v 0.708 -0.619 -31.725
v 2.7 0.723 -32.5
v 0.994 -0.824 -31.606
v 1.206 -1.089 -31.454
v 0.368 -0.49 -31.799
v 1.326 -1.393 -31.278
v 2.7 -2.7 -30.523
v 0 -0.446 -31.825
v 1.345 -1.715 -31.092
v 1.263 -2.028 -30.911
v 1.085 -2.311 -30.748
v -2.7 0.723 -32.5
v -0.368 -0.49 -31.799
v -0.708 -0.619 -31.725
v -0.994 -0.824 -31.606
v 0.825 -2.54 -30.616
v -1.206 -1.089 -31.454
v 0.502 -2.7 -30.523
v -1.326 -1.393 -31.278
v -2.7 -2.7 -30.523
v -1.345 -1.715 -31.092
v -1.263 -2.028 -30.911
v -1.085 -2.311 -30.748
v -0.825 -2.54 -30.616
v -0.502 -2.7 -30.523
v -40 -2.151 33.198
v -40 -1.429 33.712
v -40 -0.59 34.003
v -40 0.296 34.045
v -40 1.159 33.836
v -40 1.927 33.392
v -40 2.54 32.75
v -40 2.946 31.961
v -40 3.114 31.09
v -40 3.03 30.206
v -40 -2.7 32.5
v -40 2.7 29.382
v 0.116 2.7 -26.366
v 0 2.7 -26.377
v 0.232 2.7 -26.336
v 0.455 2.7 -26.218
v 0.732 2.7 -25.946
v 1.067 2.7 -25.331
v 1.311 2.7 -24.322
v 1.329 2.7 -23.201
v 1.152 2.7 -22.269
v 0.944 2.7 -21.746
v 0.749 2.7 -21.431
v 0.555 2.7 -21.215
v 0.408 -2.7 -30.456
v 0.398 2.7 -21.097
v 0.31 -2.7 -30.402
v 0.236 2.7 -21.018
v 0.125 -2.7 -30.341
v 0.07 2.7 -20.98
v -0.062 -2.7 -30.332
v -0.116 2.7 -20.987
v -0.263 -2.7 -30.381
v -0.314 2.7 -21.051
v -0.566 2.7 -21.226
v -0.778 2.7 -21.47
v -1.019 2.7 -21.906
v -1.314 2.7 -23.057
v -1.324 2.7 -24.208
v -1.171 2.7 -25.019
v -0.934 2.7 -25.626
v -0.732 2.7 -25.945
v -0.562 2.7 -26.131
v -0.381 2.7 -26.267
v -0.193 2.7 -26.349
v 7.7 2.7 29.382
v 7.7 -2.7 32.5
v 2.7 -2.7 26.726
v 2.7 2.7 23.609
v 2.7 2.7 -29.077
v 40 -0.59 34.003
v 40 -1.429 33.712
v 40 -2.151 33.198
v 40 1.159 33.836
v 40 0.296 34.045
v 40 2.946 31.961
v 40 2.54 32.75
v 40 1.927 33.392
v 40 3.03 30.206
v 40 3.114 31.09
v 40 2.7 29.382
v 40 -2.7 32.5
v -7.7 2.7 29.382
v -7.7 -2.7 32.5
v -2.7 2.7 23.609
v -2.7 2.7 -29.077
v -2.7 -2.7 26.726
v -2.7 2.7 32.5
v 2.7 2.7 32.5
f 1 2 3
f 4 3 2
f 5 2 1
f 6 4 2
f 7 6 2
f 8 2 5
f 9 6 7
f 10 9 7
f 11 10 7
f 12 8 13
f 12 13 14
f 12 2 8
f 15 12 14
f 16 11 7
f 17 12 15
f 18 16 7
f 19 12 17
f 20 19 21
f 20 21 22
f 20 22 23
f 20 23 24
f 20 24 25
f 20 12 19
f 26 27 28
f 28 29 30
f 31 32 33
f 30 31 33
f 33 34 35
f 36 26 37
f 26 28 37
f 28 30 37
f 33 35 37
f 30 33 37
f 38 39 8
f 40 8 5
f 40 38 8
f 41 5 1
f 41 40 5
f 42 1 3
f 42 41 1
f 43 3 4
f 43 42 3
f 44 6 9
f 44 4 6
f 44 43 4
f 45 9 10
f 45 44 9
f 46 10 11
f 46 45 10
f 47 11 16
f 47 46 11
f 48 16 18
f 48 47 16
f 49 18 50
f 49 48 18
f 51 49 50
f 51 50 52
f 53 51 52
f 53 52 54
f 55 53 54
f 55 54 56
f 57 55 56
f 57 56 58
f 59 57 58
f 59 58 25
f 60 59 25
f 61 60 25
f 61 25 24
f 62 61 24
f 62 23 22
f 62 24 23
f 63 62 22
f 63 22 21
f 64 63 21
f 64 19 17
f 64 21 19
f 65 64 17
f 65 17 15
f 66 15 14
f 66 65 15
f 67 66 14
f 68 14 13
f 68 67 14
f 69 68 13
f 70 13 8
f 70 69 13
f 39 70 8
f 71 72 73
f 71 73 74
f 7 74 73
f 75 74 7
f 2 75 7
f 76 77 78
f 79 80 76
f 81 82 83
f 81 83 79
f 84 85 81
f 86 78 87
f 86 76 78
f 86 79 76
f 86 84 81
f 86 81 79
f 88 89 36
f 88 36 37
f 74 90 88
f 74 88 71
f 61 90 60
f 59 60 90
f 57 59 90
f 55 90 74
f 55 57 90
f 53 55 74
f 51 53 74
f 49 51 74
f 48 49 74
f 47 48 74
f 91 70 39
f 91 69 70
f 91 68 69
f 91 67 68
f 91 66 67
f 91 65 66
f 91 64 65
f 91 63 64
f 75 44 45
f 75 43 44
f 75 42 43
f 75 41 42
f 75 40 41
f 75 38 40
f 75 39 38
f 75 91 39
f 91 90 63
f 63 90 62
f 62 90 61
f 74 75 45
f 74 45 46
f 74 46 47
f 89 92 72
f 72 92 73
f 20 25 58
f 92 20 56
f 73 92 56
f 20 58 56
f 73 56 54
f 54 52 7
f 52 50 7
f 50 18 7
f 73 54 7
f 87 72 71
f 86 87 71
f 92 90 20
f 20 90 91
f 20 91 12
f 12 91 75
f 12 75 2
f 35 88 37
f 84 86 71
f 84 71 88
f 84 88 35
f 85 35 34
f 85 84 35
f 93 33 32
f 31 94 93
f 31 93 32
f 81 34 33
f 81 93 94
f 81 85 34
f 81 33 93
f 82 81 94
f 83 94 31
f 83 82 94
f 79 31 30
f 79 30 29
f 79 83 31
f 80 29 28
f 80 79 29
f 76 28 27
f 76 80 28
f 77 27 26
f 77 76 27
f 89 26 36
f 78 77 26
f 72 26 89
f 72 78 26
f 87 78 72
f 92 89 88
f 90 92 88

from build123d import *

# Parameters (mm, degrees)
SKETCH_1_W               = 5.4
SKETCH_1_H               = 65
EXTRUDE_1_DEPTH          = 2.7
CUT_EXTRUDE_1_DEPTH      = 33.723538928
CUT_EXTRUDE_1_DEPTH_BACK = 33.723538928
EXTRUDE_2_DEPTH          = 40
CHAMFER_1_SIZE           = 5
CUT_EXTRUDE_2_DEPTH      = 73.576392116
CUT_EXTRUDE_2_DEPTH_BACK = 73.576392116
SKETCH_6_R               = 1.35


with BuildPart() as part:
    # 草图1 → 凸台-拉伸1 (new, symmetric)
    with BuildSketch(Plane(origin=(0, 0, 0), x_dir=(1, 0, 0), z_dir=(0, 1, 0))):
        Rectangle(SKETCH_1_W, SKETCH_1_H)
    extrude(amount=EXTRUDE_1_DEPTH, both=True)

    # 草图3 → 切除-拉伸1 (cut, two sides: drawn at the far end of the back side and taken through both)
    with BuildSketch(Plane(origin=(0, 0, 0), x_dir=(0, 0, -1), z_dir=(1, 0, 0)).offset(-CUT_EXTRUDE_1_DEPTH_BACK)):
        Polygon((29.07653718, 2.7), (32.5, 0.72346282), (32.5, 2.7), align=None)
        Polygon((32.5, -2.7), (32.5, 0.72346282), (30.52346282, -2.7), align=None)
    extrude(amount=CUT_EXTRUDE_1_DEPTH + CUT_EXTRUDE_1_DEPTH_BACK, mode=Mode.SUBTRACT)

    # 草图4 → 凸台-拉伸2 (add, symmetric)
    with BuildSketch(Plane(origin=(0, 0, 0), x_dir=(0, 0, -1), z_dir=(1, 0, 0))):
        with BuildLine():
            ThreePointArc((-29.382308546, 2.7), (-33.641154273, 1.558845727), (-32.5, -2.7))
            Line((-32.5, -2.7), (-29.382308546, 2.7))
        make_face()
    extrude(amount=EXTRUDE_2_DEPTH, both=True)

    # 倒角1
    chamfer_1_edges = [part.edges().sort_by_distance(p)[0] for p in [
        (-2.7, 0, 30.941154273),
        (2.7, 0, 30.941154273),
    ]]
    chamfer(chamfer_1_edges, length=CHAMFER_1_SIZE)

    # 草图6 → 切除-拉伸2 (cut, two sides: drawn at the far end of the back side and taken through both)
    with BuildSketch(Plane(origin=(0, -13.892047107, -24.06173141), x_dir=(-1, 0, 0), z_dir=(0, -0.4999999999999933, -0.8660254037844425)).offset(-CUT_EXTRUDE_2_DEPTH_BACK)):
        with Locations(Location((0, 14.17653718, 0), (0, 0, 90))):
            Circle(SKETCH_6_R)
    extrude(amount=CUT_EXTRUDE_2_DEPTH + CUT_EXTRUDE_2_DEPTH_BACK, mode=Mode.SUBTRACT)


solid = part.part
